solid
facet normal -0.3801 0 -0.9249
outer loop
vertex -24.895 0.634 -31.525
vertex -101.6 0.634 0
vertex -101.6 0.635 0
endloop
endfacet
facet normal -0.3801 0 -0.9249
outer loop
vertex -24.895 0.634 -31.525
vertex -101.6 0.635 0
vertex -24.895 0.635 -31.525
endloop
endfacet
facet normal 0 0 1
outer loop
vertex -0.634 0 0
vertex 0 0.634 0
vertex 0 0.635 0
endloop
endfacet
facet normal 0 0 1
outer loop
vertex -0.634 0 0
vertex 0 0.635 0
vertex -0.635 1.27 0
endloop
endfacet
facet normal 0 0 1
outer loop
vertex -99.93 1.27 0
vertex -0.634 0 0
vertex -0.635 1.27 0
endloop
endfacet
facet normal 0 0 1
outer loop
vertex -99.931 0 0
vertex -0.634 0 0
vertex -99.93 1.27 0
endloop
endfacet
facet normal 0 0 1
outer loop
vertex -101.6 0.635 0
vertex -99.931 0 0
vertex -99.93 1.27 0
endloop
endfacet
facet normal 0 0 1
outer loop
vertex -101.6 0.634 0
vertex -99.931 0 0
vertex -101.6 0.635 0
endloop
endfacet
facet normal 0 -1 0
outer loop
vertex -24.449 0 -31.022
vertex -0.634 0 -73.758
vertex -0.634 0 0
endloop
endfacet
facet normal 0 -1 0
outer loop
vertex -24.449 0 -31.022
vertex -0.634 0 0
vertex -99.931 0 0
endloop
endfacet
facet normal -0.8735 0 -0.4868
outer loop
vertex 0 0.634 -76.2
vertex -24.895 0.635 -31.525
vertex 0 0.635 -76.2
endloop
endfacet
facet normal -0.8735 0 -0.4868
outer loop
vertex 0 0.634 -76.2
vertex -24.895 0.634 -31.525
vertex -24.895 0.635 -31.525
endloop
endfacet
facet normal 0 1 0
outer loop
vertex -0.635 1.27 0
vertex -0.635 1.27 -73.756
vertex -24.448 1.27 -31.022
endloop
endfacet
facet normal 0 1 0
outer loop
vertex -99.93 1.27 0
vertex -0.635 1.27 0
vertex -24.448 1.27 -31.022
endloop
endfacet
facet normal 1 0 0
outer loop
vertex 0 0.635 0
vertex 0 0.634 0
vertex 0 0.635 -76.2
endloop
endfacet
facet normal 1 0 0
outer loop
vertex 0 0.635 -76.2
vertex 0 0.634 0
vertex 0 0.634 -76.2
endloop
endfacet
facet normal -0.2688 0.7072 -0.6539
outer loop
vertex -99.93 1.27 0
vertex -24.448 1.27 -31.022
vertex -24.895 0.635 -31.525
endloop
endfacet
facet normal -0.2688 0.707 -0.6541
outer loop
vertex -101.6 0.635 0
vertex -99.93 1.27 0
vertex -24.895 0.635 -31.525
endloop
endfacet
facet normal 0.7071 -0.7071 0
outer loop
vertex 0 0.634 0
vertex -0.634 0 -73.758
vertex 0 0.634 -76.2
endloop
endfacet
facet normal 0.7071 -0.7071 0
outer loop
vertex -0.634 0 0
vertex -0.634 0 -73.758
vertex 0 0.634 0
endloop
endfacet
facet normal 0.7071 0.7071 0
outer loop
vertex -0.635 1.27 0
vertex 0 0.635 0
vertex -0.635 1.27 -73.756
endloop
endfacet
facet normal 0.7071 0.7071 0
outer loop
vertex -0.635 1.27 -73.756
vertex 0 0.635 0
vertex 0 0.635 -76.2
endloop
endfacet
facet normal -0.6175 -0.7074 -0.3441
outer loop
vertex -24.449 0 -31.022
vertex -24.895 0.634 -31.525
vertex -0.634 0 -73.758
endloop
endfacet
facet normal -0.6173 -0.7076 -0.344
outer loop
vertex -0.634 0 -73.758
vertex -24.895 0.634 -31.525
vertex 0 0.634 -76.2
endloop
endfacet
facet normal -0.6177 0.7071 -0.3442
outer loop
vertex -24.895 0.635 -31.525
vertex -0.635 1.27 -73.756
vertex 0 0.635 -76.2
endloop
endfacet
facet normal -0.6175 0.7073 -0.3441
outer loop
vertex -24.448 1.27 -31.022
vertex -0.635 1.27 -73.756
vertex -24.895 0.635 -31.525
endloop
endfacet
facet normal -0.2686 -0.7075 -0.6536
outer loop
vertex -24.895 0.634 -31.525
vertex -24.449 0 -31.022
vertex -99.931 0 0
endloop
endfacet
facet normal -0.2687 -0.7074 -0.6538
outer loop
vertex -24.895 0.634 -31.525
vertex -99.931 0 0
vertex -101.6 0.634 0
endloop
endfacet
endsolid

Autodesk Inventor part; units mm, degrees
ref_plane "YZ Plane" through (0, 0, 0) normal (1, 0, 0) x (0, 1, 0)
ref_plane "XZ Plane" through (0, 0, 0) normal (0, 1, 0) x (-1, 0, 0)
ref_plane "XY Plane" through (0, 0, 0) normal (0, 0, 1) x (1, 0, 0)
sketch "Sketch1" plane through (0, 0, 0) normal (0, 1, 0) x (-1, 0, 0)
  line L0 (0, 0) -> (101.6, 0)
  line L1 (0, 0) -> (0, -76.2)
  line L2 (101.6, 0) -> (24.8951, -31.5247)
  line L3 (24.8951, -31.5247) -> (0, -76.2)
  dimension "d0" = 101.6
  dimension "d1" = 76.2
extrude "Extrusion1" add sketch "Sketch1" along normal blind 1.27
chamfer "Chamfer1" distance 0.635 angle 45 2 edges at (-12.4476, 1.27, -53.8624) (-63.2476, 1.27, -15.7624)
chamfer "Chamfer2" distance 0.635 angle 45 2 edges at (-12.4476, 0, -53.8624) (-63.2476, 0, -15.7624)
chamfer "Chamfer3" distance 0.635 angle 45 1 edges at (0, 1.27, -37.4477)
chamfer "Chamfer4" distance 0.635 angle 45 1 edges at (0, 0, -37.4483)
properties part number "Rocket_MK_II_Fins_II" material "ABS Plastic"
